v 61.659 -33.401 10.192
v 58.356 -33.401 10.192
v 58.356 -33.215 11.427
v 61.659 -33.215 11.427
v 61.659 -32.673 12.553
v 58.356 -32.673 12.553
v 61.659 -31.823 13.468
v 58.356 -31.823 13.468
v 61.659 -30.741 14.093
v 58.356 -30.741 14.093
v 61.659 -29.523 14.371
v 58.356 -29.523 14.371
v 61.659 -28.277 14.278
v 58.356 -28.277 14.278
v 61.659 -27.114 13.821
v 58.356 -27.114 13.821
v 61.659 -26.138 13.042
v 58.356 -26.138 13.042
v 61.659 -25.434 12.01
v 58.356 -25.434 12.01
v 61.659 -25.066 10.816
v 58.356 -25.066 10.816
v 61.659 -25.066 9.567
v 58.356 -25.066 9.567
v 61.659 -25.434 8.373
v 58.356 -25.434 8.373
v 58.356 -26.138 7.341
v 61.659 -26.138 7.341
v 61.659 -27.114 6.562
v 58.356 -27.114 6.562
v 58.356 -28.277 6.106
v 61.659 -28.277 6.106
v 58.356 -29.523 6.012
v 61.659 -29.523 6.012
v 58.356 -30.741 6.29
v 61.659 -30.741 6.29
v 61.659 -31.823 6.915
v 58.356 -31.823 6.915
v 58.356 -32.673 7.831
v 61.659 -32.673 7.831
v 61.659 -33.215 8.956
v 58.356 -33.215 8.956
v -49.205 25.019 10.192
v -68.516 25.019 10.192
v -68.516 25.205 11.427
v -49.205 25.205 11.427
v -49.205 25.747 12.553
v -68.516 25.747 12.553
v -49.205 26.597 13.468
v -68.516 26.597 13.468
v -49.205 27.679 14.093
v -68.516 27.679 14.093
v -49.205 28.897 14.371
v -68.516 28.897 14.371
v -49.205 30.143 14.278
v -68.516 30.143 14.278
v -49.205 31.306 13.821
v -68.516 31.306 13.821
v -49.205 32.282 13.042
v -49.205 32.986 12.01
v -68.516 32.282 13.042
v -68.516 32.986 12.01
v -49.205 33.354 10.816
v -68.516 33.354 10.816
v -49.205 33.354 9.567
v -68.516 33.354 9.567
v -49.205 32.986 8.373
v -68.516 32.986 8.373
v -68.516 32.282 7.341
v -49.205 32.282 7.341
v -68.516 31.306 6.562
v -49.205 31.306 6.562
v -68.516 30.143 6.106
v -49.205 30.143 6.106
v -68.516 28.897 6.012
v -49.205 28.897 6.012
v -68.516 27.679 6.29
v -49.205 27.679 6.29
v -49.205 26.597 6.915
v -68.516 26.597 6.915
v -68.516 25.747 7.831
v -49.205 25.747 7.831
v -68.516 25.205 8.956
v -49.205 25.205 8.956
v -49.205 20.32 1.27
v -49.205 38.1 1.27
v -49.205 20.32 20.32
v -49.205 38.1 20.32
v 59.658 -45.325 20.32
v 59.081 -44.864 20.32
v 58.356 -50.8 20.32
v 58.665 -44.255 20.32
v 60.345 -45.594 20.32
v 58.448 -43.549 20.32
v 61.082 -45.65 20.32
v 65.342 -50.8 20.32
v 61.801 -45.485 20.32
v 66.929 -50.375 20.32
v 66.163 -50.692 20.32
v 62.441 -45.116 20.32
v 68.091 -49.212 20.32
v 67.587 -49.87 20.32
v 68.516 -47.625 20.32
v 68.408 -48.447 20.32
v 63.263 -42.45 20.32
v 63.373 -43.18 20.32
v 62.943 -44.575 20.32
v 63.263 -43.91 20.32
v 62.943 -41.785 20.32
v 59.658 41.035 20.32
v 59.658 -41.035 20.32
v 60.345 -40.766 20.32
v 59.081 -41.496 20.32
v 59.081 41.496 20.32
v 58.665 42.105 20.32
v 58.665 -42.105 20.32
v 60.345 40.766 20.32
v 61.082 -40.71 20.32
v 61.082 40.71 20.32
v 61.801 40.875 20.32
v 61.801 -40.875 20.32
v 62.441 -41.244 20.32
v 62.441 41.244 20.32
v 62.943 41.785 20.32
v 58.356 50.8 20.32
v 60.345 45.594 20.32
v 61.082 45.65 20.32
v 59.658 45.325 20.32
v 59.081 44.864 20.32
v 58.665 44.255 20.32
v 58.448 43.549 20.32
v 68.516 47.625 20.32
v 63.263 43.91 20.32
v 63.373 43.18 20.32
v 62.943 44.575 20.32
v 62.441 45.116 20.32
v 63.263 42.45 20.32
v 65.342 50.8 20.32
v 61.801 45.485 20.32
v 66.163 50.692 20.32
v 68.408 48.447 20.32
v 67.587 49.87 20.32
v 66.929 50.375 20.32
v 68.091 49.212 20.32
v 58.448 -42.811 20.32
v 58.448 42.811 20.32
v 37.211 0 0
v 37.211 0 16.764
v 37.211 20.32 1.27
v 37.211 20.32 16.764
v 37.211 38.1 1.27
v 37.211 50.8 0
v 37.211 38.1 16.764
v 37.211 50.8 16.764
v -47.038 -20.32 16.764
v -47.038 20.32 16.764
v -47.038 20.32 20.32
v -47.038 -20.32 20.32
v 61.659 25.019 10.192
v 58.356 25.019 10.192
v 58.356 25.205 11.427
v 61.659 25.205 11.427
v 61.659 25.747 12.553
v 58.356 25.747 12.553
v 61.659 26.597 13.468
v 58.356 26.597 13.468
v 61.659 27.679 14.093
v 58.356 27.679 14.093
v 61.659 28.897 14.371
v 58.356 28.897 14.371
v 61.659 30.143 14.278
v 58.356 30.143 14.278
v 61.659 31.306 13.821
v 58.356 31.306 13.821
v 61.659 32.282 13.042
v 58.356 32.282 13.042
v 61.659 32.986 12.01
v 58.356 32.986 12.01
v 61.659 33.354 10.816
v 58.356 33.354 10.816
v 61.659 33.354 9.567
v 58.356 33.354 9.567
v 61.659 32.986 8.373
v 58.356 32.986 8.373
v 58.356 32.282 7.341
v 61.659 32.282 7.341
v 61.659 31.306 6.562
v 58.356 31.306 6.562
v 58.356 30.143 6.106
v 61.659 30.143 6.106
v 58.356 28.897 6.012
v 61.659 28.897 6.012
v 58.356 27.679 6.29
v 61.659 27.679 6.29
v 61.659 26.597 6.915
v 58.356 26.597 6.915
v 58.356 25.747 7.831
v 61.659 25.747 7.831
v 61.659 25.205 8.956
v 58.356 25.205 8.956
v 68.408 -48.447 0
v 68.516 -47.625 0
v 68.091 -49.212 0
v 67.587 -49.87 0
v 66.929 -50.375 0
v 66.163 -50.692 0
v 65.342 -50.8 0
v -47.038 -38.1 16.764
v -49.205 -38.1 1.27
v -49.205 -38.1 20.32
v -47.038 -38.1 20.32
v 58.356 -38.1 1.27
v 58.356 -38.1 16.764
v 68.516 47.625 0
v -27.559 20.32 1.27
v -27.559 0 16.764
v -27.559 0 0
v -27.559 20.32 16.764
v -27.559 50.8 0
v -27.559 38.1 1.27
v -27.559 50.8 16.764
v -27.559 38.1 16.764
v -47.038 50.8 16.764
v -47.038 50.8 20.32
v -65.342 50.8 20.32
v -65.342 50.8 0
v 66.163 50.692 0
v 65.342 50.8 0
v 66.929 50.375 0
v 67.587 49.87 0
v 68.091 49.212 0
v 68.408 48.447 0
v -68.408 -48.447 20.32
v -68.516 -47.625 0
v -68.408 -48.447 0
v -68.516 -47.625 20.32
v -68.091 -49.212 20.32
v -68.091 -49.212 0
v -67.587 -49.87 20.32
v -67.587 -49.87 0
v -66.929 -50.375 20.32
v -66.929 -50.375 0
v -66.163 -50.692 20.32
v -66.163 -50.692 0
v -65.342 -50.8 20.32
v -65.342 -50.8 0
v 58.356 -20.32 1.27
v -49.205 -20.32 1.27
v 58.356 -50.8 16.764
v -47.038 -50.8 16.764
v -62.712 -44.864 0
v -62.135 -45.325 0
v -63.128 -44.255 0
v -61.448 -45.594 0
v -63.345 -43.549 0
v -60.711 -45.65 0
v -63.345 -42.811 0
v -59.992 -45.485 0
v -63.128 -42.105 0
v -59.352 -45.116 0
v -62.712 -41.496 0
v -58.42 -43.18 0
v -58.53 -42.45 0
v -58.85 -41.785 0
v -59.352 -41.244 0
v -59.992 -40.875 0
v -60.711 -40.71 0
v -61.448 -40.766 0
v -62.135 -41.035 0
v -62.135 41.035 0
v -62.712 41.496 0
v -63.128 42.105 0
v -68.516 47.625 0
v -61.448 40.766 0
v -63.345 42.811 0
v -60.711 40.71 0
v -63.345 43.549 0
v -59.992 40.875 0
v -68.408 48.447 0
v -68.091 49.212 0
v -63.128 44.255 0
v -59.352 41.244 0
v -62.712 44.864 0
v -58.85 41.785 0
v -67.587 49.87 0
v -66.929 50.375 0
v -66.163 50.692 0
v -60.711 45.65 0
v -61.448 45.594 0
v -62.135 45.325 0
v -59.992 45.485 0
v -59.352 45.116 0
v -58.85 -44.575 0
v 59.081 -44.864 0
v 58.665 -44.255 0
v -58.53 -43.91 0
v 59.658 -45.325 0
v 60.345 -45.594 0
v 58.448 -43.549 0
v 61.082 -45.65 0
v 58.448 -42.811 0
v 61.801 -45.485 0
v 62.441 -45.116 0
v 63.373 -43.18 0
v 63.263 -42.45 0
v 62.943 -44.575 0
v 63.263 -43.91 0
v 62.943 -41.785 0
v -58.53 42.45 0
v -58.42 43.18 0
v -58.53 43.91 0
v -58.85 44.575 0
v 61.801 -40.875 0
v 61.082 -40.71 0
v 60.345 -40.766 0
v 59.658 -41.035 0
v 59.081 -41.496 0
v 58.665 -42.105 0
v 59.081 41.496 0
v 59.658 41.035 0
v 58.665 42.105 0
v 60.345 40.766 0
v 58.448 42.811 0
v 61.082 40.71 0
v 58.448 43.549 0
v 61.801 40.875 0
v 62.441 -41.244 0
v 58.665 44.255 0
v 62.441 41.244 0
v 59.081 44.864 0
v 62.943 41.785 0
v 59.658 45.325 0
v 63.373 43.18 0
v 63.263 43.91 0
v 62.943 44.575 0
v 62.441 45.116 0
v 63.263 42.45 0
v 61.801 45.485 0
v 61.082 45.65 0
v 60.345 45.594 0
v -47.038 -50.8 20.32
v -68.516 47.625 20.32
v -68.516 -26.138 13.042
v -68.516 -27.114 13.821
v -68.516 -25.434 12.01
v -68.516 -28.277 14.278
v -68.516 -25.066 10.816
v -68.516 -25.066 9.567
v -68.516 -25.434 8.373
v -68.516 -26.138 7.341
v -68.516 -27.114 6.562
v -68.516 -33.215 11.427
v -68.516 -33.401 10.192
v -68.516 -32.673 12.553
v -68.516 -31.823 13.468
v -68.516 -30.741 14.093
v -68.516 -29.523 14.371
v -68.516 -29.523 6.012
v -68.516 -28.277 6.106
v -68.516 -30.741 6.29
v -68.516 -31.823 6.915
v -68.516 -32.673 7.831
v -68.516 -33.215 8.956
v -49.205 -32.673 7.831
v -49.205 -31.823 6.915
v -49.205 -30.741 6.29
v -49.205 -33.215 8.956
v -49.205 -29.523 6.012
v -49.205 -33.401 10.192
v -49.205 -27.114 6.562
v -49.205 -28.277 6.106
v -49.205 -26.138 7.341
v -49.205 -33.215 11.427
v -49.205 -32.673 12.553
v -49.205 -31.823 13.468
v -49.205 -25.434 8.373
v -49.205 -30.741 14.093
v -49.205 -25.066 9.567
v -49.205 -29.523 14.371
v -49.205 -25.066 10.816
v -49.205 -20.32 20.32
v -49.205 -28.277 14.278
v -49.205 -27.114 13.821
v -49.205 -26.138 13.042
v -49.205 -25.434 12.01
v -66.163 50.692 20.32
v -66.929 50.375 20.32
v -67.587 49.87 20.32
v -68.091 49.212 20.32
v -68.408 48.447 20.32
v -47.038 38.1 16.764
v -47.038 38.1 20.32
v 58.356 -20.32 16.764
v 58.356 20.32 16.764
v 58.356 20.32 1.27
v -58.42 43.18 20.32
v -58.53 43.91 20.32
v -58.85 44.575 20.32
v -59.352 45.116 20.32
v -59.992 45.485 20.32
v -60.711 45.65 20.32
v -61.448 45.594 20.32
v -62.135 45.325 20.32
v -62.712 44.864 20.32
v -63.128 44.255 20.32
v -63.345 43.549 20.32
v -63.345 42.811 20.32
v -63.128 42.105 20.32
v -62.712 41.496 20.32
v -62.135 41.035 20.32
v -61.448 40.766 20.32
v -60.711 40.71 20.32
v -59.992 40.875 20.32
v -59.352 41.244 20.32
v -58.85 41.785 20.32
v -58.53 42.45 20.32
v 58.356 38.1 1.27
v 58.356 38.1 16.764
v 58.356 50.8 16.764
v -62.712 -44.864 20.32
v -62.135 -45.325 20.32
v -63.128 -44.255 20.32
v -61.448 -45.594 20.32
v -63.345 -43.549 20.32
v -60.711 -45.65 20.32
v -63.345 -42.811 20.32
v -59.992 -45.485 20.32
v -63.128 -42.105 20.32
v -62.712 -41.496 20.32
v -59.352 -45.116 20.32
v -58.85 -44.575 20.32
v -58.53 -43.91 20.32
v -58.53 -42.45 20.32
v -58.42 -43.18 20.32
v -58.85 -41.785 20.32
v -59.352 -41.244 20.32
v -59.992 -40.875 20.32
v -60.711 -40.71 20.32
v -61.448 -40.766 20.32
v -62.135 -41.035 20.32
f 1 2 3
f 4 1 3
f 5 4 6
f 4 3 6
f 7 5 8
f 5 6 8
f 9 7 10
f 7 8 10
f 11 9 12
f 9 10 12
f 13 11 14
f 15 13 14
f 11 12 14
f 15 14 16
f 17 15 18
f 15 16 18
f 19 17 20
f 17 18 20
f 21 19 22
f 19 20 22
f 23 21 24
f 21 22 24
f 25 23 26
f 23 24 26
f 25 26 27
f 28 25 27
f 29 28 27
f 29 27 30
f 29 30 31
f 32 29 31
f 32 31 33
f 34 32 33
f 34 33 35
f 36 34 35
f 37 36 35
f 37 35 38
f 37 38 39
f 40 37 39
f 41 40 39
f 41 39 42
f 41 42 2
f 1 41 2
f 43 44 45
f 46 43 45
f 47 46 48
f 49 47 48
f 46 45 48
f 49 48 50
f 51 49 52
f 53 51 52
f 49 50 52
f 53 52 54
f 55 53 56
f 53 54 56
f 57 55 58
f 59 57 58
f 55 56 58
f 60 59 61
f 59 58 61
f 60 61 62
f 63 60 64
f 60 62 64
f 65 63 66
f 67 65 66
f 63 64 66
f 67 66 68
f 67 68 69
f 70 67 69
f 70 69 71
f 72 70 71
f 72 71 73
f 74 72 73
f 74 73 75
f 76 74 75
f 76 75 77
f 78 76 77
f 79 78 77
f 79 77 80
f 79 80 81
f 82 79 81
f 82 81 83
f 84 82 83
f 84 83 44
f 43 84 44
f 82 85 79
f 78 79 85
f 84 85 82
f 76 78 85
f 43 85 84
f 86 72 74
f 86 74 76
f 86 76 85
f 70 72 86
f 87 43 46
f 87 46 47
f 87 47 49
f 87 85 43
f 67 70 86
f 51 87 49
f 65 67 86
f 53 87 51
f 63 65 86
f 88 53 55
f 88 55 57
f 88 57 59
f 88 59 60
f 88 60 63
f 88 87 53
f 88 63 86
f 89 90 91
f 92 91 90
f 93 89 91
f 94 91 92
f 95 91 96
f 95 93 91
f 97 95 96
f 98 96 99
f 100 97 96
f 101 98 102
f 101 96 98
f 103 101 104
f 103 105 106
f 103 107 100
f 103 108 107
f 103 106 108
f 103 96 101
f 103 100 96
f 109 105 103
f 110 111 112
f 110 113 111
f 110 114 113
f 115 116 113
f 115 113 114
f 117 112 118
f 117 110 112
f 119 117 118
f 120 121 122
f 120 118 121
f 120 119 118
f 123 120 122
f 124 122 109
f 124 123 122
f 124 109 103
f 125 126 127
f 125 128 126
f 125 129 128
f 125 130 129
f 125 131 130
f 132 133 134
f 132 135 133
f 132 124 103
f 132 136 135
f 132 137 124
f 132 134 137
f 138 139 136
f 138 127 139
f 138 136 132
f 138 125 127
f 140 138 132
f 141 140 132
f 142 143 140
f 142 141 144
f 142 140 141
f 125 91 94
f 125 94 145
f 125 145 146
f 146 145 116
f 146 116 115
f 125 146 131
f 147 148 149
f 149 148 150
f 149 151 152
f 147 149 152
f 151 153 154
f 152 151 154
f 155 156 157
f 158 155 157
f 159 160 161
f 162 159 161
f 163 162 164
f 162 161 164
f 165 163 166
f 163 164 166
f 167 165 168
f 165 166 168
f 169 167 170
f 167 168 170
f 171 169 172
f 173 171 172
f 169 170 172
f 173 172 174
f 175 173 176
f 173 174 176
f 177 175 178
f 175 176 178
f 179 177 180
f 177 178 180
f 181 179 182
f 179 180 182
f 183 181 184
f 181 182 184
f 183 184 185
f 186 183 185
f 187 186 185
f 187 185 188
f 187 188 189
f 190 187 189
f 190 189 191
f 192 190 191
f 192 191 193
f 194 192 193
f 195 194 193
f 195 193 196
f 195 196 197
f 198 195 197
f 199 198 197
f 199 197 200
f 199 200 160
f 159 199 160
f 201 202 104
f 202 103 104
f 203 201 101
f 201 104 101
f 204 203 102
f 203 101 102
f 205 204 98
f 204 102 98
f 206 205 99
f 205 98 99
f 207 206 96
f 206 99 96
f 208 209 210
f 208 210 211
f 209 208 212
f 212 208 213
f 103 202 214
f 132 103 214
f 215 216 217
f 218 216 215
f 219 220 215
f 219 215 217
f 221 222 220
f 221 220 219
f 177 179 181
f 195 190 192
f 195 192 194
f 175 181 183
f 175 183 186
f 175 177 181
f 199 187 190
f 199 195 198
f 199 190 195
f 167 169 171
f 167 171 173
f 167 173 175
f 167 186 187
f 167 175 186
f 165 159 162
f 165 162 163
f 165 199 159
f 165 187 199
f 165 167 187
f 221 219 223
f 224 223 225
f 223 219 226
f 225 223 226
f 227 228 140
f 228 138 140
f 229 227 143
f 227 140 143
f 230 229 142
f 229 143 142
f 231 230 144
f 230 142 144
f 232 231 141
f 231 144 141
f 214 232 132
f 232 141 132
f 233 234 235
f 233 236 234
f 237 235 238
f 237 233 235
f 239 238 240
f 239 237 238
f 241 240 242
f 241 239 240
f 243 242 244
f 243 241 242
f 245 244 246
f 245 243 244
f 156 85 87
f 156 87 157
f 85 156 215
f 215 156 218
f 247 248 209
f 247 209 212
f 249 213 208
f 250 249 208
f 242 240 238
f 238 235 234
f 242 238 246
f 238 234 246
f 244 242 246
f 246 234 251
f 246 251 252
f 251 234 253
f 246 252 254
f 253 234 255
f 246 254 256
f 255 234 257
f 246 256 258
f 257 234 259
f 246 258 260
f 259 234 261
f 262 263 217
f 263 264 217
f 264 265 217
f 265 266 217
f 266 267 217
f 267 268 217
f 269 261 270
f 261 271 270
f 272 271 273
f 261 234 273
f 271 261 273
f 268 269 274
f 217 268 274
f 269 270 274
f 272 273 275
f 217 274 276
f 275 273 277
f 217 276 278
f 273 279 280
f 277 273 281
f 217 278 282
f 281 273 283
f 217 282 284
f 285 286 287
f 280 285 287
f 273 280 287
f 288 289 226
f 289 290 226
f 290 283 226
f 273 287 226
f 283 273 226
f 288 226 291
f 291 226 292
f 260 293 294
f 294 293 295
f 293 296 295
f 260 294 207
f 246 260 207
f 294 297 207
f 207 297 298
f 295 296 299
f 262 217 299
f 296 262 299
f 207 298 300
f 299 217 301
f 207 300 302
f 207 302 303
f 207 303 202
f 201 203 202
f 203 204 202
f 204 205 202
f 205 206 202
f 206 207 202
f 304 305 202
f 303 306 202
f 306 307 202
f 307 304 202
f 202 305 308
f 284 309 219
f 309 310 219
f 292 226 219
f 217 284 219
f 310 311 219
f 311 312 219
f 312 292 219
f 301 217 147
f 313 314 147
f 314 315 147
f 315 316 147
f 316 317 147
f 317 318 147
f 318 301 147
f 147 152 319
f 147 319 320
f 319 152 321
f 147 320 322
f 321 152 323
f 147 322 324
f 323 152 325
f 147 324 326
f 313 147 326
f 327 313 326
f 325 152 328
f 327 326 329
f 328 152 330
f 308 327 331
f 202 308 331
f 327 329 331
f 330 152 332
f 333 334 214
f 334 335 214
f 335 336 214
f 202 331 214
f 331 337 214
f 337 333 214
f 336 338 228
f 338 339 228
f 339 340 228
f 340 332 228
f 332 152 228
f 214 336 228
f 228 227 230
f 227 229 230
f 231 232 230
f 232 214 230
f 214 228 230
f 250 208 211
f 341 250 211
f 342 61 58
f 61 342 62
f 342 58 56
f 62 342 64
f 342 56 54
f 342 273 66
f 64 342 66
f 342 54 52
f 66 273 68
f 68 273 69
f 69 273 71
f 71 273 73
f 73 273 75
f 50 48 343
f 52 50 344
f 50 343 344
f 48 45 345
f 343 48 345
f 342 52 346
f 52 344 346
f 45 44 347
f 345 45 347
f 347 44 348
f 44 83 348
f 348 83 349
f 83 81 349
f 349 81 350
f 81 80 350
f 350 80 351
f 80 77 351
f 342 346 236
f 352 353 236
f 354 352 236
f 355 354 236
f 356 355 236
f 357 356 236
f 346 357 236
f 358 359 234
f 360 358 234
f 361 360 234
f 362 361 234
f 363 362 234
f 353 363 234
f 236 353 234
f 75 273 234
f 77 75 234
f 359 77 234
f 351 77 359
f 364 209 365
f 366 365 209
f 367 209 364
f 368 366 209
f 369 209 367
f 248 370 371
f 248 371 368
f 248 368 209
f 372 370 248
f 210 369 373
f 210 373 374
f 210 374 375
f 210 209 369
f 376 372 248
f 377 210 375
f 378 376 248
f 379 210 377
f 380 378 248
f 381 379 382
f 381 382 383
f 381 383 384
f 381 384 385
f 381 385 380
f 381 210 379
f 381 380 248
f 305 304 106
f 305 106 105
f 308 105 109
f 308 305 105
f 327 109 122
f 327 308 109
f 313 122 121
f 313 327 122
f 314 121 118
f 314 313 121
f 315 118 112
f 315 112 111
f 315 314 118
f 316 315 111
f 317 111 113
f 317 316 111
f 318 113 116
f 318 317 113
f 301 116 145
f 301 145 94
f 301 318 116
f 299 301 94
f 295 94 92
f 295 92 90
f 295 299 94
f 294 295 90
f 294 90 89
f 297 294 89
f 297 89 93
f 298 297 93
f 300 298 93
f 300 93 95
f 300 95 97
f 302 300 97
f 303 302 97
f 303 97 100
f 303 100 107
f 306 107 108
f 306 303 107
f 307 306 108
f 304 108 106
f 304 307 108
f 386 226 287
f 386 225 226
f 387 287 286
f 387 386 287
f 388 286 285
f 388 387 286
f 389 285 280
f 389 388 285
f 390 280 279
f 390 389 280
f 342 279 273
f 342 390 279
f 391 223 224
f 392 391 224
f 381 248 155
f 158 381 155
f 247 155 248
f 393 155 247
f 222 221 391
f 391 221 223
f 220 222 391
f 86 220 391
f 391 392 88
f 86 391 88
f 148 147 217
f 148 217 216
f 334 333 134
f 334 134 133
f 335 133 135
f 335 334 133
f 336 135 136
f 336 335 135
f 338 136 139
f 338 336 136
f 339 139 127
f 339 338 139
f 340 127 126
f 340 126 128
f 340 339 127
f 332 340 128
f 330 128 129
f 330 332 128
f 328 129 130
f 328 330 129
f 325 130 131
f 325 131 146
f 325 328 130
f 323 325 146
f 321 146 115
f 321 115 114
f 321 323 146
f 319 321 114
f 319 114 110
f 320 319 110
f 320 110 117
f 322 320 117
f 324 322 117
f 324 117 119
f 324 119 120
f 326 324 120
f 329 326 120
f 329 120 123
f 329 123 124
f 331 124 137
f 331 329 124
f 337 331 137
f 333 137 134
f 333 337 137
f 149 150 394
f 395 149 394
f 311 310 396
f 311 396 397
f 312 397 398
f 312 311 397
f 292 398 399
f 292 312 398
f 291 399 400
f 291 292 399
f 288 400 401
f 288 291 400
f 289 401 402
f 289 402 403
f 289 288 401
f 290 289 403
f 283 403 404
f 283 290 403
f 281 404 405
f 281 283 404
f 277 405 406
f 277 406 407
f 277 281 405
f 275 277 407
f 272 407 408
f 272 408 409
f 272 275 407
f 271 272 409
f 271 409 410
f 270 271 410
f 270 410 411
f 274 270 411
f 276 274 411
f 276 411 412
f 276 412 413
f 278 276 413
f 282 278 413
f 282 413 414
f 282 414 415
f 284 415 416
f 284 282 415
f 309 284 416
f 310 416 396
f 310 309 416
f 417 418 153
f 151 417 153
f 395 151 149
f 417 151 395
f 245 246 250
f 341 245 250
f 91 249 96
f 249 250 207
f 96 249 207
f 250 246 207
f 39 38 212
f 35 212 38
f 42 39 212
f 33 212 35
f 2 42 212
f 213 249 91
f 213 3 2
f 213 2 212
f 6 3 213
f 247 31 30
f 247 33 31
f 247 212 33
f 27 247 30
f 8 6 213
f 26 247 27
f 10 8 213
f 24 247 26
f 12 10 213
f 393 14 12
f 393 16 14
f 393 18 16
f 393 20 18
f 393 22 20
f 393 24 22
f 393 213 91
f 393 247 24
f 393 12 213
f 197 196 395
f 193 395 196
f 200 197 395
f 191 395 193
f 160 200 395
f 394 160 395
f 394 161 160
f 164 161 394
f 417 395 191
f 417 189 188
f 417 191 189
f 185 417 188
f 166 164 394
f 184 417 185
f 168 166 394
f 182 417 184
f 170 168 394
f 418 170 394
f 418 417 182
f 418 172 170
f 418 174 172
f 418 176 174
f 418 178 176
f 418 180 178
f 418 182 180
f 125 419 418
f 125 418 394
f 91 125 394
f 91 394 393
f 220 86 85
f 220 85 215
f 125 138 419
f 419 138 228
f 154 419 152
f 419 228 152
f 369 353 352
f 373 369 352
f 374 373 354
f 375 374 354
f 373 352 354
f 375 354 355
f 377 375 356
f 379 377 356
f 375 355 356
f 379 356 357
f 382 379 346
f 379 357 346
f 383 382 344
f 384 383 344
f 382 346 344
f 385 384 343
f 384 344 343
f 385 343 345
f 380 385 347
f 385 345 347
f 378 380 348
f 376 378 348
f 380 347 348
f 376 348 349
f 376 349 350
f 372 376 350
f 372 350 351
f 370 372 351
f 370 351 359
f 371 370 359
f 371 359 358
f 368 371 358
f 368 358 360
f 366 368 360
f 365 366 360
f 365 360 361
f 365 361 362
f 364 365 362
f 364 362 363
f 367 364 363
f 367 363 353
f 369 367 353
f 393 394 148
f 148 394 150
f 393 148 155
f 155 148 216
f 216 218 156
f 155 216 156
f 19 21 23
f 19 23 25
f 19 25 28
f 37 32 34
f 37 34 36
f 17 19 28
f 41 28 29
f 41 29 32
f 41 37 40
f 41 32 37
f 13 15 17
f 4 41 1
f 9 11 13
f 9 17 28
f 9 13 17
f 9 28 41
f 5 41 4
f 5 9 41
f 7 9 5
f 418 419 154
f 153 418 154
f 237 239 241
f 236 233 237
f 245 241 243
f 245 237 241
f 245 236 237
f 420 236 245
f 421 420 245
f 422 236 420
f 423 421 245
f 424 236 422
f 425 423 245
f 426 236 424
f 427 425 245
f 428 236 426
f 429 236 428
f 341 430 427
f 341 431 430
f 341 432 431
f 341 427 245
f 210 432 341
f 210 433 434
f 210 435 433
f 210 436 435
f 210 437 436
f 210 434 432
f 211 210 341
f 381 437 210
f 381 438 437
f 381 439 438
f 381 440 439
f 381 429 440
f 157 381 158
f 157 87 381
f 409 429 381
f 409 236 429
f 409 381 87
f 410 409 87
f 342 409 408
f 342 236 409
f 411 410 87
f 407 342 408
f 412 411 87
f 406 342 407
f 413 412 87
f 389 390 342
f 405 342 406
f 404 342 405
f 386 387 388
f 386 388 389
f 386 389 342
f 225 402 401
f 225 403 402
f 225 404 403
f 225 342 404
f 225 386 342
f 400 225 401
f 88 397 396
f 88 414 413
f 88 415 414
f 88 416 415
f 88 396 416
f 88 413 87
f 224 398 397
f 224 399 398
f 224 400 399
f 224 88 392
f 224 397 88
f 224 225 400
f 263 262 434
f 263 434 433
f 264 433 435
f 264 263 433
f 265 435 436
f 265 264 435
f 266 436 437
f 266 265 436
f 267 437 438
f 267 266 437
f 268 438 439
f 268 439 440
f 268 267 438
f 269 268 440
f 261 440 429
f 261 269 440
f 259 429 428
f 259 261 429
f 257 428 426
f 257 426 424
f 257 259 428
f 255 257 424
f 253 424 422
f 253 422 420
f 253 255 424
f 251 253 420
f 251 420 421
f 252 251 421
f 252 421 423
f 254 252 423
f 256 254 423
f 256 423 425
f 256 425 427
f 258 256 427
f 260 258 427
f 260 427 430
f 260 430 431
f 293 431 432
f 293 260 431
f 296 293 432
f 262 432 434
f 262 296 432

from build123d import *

# Parameters (mm, degrees)
F1_R      = 2.4765
F2_DEPTH  = 20.32
F3_W      = 58.3565
F3_H      = 3.556
F3_W_2    = 47.03826
F4_DEPTH  = 131.572
F5_R      = 3.175
F6_W      = 62.404111
F6_H      = 27.47877
F7_DEPTH  = 32.385
F8_W      = 49.20488
F8_H      = 17.78
F8_W_2    = 58.3565
F8_W_3    = 107.56138
F9_DEPTH  = 19.05
F10_R     = 4.191
F11_DEPTH = 130.175


with BuildPart() as f2:
    # F1 (on Top) → F2 (new body)
    with BuildSketch(Plane.XY):
        Polygon((68.5165, 50.8), (0, 50.8), (-68.5165, 50.8), (-68.5165, 0), (-68.5165, -50.8), (0, -50.8), (68.5165, -50.8), (68.5165, 0), align=None)
        with Locations((-60.8965, -43.18)):
            Circle(F1_R, mode=Mode.SUBTRACT)
        with Locations((60.8965, -43.18)):
            Circle(F1_R, mode=Mode.SUBTRACT)
        with Locations((-60.8965, 43.18)):
            Circle(F1_R, mode=Mode.SUBTRACT)
        with Locations((60.8965, 43.18)):
            Circle(F1_R, mode=Mode.SUBTRACT)
    extrude(amount=F2_DEPTH)

    # F3 (on face) → F4 (cut)
    with BuildSketch(Plane(origin=(0, 50.8, 0), x_dir=(-1, 0, 0), z_dir=(0, 1, 0))):
        with Locations((-29.17825, 18.542)):
            Rectangle(F3_W, F3_H)
        with Locations((23.51913, 18.542)):
            Rectangle(F3_W_2, F3_H)
    extrude(amount=-F4_DEPTH, mode=Mode.SUBTRACT)

    # F5
    f5_edges = [f2.edges().sort_by_distance(p)[0] for p in [
        (68.5165, 50.8, 10.16),
        (-68.5165, 50.8, 10.16),
        (-68.5165, -50.8, 10.16),
        (68.5165, -50.8, 10.16),
    ]]
    fillet(f5_edges, radius=F5_R)

    # F6 (on offset) → F7 (cut, symmetric)
    with BuildSketch(Plane.YZ.offset(4.826)):
        with Locations((31.202056, 13.739385)):
            Rectangle(F6_W, F6_H)
    extrude(amount=F7_DEPTH, both=True, mode=Mode.SUBTRACT)

    # F8 (on face) → F9 (cut)
    with BuildSketch(Plane.XY.offset(20.32)):
        with Locations((-24.60244, 29.21)):
            Rectangle(F8_W, F8_H)
        with Locations((29.17825, 29.21)):
            Rectangle(F8_W_2, F8_H)
        with Locations((4.57581, -29.21)):
            Rectangle(F8_W_3, F8_H)
    extrude(amount=-F9_DEPTH, mode=Mode.SUBTRACT)

    # F10 (on face) → F11 (cut)
    with BuildSketch(Plane(origin=(-68.5165, 0, 0), x_dir=(0, -1, 0), z_dir=(-1, 0, 0))):
        with Locations((-29.21, 10.19175)):
            Circle(F10_R)
        with Locations((29.21, 10.19175)):
            Circle(F10_R)
    extrude(amount=-F11_DEPTH, mode=Mode.SUBTRACT)


solid = f2.part
